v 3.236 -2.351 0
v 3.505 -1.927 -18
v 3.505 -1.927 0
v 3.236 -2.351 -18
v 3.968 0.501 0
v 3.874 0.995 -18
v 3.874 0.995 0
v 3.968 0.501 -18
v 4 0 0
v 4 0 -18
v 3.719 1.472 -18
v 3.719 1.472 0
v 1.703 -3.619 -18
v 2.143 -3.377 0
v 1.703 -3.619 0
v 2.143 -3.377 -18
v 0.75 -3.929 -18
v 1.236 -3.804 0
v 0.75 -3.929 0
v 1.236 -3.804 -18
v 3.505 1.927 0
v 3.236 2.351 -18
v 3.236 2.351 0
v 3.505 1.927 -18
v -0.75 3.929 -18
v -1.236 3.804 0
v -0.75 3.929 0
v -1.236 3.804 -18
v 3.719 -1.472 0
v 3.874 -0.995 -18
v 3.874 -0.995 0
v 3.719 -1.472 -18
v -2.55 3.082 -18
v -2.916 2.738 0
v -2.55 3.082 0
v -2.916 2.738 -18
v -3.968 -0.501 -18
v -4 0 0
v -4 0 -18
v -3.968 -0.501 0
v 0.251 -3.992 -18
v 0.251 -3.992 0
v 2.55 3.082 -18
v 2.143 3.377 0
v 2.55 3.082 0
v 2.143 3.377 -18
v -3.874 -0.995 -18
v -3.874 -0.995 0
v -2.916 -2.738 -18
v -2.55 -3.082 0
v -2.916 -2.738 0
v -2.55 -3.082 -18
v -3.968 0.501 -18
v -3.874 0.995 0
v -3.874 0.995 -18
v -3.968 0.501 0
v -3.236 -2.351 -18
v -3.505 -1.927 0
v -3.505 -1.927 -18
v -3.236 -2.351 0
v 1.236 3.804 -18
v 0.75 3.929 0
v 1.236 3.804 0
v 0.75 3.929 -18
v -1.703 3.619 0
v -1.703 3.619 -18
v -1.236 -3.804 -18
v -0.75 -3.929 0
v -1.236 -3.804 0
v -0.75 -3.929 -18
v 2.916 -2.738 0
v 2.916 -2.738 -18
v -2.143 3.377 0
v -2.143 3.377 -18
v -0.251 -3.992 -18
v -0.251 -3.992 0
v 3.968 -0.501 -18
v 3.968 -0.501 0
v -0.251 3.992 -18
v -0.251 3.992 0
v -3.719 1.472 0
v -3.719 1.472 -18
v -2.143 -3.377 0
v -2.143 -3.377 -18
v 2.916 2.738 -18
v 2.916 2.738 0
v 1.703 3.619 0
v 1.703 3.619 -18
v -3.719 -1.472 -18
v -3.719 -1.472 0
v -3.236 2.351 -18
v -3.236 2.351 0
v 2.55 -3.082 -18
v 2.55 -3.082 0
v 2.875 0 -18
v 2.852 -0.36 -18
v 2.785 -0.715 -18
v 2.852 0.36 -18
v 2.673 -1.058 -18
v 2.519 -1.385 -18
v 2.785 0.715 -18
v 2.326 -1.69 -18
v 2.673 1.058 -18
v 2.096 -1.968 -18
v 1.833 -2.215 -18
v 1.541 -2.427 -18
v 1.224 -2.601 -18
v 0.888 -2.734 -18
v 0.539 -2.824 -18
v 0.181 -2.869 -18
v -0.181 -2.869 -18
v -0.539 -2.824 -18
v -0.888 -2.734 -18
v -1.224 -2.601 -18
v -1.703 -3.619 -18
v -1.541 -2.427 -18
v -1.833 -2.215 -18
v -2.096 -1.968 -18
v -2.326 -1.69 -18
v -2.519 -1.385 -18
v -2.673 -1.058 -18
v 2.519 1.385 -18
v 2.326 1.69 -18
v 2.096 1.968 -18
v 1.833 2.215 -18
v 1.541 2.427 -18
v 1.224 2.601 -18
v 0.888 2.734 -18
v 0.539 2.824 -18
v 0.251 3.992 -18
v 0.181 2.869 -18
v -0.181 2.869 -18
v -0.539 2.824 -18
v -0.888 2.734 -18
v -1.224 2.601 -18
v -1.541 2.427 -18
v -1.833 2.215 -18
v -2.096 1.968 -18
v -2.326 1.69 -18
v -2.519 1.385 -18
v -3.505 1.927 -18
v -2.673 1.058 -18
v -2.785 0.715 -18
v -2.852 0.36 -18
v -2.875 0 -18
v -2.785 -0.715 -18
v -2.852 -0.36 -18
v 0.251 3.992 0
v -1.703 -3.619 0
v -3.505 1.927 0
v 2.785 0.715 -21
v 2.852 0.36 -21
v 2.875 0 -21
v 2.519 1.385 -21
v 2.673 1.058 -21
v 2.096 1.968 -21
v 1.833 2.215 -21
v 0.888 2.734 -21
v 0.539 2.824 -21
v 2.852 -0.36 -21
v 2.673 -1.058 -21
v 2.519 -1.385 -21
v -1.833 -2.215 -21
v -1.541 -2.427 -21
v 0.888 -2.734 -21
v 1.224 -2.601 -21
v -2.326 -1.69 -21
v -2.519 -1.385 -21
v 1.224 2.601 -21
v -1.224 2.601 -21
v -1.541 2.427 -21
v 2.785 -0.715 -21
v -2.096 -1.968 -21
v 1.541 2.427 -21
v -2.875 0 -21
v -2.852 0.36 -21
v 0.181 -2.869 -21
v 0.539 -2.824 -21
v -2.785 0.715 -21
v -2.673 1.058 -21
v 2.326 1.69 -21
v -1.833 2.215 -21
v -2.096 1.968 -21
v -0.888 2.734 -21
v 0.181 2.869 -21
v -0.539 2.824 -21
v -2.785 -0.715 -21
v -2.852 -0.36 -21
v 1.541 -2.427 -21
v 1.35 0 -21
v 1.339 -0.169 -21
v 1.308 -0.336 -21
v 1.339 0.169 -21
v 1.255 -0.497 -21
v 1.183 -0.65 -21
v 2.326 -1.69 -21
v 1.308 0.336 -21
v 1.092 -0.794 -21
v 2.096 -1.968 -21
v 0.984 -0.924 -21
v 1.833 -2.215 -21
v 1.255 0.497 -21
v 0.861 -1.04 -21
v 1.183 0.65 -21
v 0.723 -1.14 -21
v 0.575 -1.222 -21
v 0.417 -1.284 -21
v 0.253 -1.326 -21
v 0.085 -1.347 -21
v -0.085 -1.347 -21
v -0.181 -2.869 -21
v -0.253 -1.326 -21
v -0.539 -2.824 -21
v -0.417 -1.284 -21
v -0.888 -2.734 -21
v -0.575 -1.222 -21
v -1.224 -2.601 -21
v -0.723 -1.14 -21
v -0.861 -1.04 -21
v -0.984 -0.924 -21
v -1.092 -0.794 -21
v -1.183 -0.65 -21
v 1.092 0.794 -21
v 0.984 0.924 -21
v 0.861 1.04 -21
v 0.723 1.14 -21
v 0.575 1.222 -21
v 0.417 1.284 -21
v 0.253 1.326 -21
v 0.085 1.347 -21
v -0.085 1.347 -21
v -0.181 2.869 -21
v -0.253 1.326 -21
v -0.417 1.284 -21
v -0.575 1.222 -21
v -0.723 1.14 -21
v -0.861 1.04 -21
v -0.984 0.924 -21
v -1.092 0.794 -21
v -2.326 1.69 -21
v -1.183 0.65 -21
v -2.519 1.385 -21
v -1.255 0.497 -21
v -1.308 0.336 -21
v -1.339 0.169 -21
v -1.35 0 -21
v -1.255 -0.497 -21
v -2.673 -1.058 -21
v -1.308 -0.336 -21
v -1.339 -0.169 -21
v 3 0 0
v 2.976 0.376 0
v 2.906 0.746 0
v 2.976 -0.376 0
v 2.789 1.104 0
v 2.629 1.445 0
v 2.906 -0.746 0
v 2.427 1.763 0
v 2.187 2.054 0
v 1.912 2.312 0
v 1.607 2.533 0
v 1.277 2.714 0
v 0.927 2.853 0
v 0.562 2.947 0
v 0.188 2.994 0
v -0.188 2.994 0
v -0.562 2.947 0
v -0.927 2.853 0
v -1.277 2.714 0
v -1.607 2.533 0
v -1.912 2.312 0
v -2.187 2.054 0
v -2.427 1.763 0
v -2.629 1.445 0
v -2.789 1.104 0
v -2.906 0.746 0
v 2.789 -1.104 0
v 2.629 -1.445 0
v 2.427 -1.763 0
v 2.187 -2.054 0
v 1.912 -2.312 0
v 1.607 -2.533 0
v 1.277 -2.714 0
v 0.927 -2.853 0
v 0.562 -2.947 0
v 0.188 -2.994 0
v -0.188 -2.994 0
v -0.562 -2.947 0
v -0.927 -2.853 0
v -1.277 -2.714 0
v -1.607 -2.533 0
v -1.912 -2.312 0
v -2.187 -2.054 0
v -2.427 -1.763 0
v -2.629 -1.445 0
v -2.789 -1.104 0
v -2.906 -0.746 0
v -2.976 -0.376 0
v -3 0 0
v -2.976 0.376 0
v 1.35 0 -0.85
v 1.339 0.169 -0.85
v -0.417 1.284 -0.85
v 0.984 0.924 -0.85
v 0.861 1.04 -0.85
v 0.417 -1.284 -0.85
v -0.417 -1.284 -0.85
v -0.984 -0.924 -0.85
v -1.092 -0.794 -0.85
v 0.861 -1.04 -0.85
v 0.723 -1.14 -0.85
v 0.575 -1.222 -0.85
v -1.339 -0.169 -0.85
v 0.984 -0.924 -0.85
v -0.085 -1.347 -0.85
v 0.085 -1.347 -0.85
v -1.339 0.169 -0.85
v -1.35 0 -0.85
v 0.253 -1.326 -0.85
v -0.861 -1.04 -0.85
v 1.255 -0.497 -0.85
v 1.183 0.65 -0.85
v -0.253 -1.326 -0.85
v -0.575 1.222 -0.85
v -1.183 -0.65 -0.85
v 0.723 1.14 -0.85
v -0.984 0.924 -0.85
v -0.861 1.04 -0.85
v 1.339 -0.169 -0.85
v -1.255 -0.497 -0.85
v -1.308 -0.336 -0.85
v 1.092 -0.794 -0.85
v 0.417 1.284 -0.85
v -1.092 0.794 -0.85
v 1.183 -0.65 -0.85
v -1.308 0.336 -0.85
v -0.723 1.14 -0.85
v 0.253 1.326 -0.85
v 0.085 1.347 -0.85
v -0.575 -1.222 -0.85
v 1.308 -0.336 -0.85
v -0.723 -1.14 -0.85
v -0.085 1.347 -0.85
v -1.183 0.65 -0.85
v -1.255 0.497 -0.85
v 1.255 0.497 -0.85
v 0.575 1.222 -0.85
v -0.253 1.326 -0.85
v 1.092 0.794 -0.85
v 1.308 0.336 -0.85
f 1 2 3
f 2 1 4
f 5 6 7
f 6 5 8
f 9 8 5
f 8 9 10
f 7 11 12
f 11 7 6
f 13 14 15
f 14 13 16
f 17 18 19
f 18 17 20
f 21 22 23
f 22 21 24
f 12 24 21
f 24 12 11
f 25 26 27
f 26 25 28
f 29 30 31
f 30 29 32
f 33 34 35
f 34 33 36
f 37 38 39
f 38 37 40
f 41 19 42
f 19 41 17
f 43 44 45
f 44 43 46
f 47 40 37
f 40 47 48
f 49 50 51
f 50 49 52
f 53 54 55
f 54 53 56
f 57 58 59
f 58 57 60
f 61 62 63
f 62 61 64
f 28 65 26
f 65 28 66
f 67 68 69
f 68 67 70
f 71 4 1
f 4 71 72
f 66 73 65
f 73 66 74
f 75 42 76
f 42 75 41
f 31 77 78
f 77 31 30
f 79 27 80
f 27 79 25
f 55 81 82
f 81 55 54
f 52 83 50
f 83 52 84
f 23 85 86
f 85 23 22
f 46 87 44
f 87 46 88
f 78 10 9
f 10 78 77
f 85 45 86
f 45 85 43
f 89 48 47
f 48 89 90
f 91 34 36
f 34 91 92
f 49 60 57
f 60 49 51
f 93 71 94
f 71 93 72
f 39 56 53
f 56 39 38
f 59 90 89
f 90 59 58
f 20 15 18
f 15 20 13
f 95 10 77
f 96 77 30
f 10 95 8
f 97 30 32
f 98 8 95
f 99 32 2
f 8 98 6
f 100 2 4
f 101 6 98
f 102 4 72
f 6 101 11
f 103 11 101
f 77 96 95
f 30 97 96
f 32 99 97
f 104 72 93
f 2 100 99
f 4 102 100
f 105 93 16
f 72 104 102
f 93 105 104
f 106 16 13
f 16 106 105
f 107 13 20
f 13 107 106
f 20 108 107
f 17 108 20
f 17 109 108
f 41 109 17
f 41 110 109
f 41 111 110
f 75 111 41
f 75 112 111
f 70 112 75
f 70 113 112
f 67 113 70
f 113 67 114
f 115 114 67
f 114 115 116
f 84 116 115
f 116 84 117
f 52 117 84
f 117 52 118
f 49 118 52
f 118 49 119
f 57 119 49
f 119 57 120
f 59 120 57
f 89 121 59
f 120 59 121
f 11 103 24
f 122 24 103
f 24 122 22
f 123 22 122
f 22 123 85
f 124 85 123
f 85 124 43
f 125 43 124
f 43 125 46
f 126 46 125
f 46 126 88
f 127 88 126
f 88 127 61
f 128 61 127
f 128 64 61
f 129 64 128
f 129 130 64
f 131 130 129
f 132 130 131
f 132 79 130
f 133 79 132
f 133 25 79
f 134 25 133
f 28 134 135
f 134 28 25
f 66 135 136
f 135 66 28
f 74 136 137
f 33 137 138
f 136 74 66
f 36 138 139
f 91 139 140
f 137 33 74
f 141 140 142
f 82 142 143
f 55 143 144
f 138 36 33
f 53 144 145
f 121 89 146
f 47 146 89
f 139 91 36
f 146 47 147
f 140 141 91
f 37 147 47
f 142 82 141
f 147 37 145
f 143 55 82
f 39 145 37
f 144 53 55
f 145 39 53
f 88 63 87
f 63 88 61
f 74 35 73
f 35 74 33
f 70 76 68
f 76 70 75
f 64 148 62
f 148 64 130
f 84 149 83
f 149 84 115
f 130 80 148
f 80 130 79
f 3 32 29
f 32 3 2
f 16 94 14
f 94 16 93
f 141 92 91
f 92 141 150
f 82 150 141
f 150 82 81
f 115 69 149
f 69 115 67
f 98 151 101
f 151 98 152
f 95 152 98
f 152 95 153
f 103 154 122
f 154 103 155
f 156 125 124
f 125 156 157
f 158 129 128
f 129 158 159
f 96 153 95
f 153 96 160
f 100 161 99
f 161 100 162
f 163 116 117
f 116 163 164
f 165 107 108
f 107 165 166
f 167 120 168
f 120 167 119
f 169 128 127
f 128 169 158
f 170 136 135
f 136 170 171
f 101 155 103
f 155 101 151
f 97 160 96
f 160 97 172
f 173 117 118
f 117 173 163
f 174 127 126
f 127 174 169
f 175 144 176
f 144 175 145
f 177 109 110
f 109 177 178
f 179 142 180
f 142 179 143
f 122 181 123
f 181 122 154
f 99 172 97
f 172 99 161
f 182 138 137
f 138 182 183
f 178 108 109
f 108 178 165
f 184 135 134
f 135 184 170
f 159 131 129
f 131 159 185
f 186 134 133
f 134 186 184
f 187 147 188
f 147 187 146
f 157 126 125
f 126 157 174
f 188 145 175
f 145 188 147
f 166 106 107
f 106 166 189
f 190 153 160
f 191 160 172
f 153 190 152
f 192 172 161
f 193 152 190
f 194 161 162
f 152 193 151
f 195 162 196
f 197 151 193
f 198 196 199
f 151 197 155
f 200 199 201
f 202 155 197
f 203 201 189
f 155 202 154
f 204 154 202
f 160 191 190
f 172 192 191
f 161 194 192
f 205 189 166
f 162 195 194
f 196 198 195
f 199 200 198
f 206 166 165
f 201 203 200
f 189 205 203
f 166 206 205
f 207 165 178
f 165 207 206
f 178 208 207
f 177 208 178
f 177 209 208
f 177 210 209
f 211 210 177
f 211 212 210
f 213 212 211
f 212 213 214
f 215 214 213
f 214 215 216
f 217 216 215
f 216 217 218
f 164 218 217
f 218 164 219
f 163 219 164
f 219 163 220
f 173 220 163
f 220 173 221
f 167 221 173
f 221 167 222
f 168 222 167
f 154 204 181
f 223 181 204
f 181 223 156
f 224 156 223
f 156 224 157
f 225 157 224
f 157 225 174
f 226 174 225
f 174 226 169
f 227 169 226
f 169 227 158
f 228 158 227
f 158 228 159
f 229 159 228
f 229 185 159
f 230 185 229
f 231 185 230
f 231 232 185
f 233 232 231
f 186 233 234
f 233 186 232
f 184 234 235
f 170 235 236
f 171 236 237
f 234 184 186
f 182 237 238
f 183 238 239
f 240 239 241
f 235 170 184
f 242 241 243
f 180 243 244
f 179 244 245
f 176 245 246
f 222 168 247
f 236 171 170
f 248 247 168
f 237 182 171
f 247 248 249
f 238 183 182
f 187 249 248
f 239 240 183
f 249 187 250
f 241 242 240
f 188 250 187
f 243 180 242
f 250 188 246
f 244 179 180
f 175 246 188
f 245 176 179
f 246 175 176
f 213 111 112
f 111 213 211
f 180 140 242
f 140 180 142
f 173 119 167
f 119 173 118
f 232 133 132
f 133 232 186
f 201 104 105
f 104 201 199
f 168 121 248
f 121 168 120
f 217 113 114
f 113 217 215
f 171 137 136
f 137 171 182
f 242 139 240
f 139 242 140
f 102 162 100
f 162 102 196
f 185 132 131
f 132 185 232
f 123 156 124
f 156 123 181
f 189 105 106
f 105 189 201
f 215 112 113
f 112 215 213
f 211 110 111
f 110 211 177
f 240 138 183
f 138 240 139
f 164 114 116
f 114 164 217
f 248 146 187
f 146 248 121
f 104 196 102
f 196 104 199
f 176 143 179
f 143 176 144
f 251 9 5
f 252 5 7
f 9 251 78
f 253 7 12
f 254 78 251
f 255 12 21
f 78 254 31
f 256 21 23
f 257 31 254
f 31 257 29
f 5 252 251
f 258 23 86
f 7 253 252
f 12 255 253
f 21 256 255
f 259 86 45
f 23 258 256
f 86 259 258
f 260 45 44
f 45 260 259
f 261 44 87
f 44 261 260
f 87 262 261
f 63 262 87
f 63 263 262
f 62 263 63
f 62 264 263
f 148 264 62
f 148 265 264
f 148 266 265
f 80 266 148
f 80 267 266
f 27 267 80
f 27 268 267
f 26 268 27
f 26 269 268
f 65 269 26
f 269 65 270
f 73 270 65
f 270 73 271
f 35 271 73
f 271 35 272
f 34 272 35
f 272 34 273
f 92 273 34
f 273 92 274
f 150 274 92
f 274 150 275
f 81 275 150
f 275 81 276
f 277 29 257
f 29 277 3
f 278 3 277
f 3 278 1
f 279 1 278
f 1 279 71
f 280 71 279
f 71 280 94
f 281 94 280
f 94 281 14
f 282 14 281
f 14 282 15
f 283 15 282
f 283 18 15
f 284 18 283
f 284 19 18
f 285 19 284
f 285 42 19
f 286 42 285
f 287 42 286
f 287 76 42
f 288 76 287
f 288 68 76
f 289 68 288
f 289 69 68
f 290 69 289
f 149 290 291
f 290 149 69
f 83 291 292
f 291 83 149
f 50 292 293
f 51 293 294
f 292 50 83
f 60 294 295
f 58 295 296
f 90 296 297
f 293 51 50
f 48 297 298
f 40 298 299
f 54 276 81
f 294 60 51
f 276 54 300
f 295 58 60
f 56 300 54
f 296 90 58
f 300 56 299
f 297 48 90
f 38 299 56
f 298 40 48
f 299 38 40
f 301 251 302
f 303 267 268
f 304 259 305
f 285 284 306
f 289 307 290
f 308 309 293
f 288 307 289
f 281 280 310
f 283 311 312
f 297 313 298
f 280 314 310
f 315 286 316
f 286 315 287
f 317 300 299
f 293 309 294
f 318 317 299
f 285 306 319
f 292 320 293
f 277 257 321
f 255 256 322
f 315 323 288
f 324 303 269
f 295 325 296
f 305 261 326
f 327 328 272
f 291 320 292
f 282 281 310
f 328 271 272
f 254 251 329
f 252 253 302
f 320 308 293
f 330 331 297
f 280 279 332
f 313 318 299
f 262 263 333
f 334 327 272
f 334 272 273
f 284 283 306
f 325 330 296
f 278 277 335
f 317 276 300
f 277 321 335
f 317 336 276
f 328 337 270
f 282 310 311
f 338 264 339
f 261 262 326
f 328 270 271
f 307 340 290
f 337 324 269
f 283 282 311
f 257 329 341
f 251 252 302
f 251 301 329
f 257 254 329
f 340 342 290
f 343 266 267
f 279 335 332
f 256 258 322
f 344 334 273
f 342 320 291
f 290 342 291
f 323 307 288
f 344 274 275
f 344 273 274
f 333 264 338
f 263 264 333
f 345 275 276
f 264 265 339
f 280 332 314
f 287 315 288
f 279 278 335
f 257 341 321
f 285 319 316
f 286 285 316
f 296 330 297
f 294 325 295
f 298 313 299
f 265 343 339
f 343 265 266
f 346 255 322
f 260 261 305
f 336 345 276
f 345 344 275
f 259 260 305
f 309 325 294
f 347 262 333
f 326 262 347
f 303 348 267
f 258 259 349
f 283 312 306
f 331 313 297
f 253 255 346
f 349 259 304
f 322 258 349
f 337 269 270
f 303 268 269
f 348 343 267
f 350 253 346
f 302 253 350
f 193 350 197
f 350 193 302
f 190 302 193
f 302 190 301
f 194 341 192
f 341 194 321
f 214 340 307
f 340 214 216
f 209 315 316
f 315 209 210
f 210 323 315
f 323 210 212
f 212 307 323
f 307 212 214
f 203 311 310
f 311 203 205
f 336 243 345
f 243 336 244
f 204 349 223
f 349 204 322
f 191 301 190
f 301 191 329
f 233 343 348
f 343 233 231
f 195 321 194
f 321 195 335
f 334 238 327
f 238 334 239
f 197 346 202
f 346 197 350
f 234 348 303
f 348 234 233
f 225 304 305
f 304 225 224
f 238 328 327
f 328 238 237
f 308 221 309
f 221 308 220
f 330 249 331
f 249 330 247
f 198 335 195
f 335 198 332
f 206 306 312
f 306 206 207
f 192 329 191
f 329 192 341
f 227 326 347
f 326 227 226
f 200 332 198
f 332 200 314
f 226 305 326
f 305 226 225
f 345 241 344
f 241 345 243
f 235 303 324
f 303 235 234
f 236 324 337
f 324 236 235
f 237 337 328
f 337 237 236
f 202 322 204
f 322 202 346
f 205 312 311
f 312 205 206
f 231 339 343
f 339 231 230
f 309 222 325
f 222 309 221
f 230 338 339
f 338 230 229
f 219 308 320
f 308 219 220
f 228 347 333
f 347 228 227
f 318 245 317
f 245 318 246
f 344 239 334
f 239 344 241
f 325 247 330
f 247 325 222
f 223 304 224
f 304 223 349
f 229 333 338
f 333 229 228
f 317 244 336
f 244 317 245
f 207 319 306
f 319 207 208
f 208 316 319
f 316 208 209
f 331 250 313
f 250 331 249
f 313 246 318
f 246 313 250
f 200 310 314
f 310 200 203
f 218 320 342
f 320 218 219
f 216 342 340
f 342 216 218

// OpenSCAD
$fn = 50;

difference() {
	union() {
		translate(v = [0, 0, -18.0]) {
			cylinder(h = 21, r = 4.0);
		}
		#translate(v = [0, 0, -21.0]) {
			cylinder(h = 21, r = 2.875);
		}
	}
	union() {
		translate(v = [0, 0, 0]) {
			rotate(a = [0, 0, 0]) {
				difference() {
					union() {
						translate(v = [0, 0, -21.0]) {
							cylinder(h = 21, r = 1.0);
						}
						translate(v = [0, 0, -0.85]) {
							cylinder(h = 0.85, r1 = 1.35, r2 = 3.0);
						}
						translate(v = [0, 0, -21.0]) {
							cylinder(h = 21, r = 1.35);
						}
						translate(v = [0, 0, -21.0]) {
							cylinder(h = 21, r = 1.0);
						}
					}
					union();
				}
			}
		}
		#cylinder(h = 3, r = 5.0);
	}
}
